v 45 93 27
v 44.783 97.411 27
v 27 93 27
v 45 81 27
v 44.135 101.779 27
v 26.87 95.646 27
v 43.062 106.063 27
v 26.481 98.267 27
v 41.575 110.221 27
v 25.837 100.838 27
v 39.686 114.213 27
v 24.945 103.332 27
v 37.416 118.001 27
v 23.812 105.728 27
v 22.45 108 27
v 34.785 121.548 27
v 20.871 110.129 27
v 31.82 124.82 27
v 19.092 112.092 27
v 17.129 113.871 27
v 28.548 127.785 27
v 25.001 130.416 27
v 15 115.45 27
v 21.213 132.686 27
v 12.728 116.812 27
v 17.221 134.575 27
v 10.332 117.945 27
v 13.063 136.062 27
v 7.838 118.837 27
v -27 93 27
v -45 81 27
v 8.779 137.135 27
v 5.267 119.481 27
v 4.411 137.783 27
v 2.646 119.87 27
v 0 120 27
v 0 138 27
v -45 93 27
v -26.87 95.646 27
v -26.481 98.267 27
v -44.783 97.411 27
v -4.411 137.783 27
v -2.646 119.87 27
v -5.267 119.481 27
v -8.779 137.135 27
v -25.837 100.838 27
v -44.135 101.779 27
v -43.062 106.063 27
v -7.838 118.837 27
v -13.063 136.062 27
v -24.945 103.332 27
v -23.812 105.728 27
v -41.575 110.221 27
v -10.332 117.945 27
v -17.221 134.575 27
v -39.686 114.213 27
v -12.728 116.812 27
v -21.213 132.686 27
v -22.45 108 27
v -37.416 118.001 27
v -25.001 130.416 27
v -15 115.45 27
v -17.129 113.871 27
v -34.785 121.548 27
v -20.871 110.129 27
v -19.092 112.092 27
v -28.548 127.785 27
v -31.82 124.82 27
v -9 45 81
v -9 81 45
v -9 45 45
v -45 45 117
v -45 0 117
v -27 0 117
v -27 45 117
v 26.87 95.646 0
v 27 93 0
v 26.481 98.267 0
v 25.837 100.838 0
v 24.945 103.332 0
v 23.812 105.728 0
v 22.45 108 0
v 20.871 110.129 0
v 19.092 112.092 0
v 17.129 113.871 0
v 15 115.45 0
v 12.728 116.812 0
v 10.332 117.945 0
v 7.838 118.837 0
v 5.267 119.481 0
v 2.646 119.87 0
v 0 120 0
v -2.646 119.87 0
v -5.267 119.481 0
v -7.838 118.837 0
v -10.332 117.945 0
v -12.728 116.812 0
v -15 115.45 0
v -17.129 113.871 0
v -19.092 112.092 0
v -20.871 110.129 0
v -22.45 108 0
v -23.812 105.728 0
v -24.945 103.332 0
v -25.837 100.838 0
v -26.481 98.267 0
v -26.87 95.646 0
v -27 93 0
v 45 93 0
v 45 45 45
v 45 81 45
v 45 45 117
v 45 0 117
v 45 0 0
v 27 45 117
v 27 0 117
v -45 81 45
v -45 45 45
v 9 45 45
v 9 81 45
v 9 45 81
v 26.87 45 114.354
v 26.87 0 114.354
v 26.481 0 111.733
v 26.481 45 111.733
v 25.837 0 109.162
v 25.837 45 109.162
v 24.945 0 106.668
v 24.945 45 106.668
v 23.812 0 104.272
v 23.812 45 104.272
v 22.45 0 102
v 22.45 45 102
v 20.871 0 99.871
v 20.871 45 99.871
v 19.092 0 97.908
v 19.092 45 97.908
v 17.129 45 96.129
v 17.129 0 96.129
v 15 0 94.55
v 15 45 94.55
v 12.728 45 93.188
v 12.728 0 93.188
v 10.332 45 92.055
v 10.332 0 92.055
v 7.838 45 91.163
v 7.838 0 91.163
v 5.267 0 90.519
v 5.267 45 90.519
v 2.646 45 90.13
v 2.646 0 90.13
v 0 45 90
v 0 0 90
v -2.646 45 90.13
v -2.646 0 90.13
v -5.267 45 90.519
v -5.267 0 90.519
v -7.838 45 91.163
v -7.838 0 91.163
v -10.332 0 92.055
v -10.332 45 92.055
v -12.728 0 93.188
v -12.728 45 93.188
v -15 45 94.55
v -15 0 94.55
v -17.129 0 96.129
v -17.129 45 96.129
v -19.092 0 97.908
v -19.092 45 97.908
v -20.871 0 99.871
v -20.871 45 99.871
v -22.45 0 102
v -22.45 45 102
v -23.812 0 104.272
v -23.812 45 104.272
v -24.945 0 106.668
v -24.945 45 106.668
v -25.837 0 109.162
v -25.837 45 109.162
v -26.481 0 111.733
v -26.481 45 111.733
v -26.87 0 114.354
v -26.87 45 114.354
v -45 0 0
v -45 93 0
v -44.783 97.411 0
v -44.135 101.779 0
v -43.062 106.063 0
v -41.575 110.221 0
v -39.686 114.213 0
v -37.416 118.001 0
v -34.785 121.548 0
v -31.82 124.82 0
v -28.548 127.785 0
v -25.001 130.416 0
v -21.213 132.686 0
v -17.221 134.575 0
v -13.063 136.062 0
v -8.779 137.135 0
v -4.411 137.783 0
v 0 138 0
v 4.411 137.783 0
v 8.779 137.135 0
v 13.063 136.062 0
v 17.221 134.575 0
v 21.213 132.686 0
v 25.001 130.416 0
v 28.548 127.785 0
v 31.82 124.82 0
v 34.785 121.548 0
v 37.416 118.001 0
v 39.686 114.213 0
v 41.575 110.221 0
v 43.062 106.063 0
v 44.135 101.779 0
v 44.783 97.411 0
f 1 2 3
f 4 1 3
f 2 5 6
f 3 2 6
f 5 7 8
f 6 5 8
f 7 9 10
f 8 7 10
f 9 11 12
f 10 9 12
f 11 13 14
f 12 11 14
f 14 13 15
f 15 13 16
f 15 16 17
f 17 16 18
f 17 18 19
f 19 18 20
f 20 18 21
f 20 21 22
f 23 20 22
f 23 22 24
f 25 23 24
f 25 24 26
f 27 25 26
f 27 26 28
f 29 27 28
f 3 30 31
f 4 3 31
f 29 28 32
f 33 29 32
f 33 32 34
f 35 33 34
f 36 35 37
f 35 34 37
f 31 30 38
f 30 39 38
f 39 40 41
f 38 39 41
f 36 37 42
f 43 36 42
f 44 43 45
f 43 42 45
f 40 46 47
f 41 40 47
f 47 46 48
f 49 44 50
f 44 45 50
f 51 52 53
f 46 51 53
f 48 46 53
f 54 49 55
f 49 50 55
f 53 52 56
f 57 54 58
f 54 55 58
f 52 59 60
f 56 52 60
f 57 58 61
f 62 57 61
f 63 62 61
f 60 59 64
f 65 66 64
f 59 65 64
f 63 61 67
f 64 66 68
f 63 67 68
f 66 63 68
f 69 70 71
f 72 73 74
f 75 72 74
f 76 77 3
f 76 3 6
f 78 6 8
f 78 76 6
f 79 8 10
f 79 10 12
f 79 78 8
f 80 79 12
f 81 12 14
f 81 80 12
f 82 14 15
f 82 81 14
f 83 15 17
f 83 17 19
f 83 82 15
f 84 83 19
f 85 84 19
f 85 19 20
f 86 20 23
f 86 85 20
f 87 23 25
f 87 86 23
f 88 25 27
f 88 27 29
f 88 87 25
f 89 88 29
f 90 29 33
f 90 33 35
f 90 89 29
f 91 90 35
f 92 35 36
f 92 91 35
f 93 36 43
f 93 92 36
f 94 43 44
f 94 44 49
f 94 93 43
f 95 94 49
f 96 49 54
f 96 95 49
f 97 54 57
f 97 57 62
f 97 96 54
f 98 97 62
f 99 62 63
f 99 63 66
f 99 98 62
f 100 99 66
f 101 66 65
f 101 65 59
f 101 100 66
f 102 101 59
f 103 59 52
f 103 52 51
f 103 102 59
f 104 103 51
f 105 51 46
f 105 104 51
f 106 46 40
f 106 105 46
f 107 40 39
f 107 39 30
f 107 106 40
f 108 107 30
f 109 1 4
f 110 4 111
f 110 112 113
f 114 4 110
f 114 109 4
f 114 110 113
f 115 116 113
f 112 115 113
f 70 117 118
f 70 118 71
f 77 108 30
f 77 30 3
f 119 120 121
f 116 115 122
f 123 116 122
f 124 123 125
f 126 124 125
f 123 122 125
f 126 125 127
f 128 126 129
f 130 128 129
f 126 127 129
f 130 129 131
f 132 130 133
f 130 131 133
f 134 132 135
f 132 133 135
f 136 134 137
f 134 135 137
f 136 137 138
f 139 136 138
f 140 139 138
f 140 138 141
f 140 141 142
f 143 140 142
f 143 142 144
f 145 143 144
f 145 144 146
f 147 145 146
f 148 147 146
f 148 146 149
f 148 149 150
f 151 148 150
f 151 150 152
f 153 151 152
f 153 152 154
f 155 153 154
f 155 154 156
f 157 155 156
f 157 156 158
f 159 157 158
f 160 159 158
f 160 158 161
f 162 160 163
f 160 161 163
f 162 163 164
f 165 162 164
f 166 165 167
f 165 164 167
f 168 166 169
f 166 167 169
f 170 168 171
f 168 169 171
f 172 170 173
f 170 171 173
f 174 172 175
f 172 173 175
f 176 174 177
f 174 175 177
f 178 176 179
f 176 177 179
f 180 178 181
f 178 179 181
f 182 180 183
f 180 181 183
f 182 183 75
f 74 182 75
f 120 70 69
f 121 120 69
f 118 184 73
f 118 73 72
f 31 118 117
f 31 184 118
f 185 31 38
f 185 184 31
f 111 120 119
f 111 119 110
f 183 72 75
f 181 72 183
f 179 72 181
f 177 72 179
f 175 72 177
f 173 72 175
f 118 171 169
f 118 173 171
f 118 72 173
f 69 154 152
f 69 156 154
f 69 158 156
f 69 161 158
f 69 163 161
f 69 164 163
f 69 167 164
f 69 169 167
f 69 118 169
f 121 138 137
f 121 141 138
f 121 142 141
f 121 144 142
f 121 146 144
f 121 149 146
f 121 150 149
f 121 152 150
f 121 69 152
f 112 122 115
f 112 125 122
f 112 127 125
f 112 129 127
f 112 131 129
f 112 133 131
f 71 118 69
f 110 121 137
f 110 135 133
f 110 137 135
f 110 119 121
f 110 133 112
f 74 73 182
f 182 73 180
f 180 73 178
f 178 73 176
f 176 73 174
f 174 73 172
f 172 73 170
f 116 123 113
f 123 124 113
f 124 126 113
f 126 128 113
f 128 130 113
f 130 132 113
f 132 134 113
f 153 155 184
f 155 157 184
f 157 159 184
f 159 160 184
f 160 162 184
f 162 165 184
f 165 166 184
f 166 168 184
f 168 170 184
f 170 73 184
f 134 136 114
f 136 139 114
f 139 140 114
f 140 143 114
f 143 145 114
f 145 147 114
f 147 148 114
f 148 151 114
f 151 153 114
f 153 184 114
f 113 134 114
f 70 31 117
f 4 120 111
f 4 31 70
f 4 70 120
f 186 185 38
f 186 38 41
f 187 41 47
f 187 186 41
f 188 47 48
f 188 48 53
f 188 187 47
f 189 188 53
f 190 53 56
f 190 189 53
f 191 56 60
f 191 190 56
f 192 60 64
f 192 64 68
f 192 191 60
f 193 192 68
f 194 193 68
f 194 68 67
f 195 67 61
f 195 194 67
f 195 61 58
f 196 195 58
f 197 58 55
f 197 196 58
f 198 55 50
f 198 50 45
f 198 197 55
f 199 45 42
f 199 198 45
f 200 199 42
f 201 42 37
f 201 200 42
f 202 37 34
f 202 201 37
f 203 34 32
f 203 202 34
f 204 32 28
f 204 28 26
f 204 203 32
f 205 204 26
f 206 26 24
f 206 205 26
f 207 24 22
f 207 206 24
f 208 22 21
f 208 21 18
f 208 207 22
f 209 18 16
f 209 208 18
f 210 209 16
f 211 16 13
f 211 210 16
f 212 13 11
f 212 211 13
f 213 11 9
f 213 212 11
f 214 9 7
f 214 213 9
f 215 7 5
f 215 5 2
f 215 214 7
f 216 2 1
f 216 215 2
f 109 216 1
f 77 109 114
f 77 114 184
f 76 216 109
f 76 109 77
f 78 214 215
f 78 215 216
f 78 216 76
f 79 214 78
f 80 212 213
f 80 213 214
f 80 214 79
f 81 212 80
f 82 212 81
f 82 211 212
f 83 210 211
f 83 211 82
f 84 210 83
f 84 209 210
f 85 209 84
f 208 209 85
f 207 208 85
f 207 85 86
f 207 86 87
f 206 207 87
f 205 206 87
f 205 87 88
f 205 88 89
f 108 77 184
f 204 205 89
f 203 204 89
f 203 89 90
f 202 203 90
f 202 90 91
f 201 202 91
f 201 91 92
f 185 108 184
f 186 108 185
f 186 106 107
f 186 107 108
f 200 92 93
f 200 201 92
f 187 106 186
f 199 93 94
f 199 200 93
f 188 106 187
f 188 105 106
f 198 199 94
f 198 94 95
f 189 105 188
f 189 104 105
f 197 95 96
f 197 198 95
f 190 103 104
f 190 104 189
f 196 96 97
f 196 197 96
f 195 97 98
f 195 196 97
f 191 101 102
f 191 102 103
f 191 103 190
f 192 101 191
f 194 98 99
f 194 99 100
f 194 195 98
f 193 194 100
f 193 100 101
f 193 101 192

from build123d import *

# Parameters (mm, degrees)
SKETCH1_W           = 90
SKETCH1_H           = 45
BOSS_EXTRUDE1_DEPTH = 117
SKETCH1_3_W         = 90
SKETCH1_3_H         = 36
BOSS_EXTRUDE2_DEPTH = 45
BOSS_EXTRUDE3_DEPTH = 27
RIB2_REACH          = 188.435
SKETCH2_WALL_W      = 425.781638764
SKETCH2_WALL_H      = 18
CUT_EXTRUDE1_REACH  = 158.087
SKETCH3_R           = 27


with BuildPart() as part:
    # Sketch1 → Boss-Extrude1 (new body)
    with BuildSketch(Plane.XY):
        with Locations((0, 22.5)):
            Rectangle(SKETCH1_W, SKETCH1_H)
    extrude(amount=BOSS_EXTRUDE1_DEPTH)

    # Sketch1<3> → Boss-Extrude2 (add)
    with BuildSketch(Plane.XY):
        with Locations((0, 63)):
            Rectangle(SKETCH1_3_W, SKETCH1_3_H)
    extrude(amount=BOSS_EXTRUDE2_DEPTH)

    # Sketch1<4> → Boss-Extrude3 (add)
    with BuildSketch(Plane.XY):
        with BuildLine():
            Line((-45, 93), (-45, 81))
            Line((-45, 81), (45, 81))
            Line((45, 81), (45, 93))
            ThreePointArc((45, 93), (0, 138), (-45, 93))
        make_face()
        with BuildLine():
            Line((27, 93), (-27, 93))
            ThreePointArc((-27, 93), (0, 120), (27, 93))
        make_face(mode=Mode.SUBTRACT)
    extrude(amount=BOSS_EXTRUDE3_DEPTH)

    # Sketch2 wall → Rib2 (add, up to next)
    with BuildSketch(Plane(origin=(0, 63, 63), x_dir=(0, -0.707106781187, 0.707106781187), z_dir=(0, -0.707106781187, -0.707106781187)), mode=Mode.PRIVATE) as rib2_sk1:
        Rectangle(SKETCH2_WALL_W, SKETCH2_WALL_H)
    rib2_tool1 = extrude(rib2_sk1.sketch, amount=RIB2_REACH, mode=Mode.PRIVATE) - part.part
    add(rib2_tool1.solids().sort_by_distance((0, 63, 63))[0])

    # Sketch3 → Cut-Extrude1 (cut, up to next)
    with BuildSketch(Plane(origin=(0, 45, 0), x_dir=(1, 0, 0), z_dir=(0, 1, 0)), mode=Mode.PRIVATE) as cut_extrude1_sk1:
        with Locations((0, -117)):
            Circle(SKETCH3_R)
    cut_extrude1_tool1 = extrude(cut_extrude1_sk1.sketch, amount=-CUT_EXTRUDE1_REACH, mode=Mode.PRIVATE) & part.part
    add(cut_extrude1_tool1.solids().sort_by_distance((0, 45, 117))[0], mode=Mode.SUBTRACT)


solid = part.part
